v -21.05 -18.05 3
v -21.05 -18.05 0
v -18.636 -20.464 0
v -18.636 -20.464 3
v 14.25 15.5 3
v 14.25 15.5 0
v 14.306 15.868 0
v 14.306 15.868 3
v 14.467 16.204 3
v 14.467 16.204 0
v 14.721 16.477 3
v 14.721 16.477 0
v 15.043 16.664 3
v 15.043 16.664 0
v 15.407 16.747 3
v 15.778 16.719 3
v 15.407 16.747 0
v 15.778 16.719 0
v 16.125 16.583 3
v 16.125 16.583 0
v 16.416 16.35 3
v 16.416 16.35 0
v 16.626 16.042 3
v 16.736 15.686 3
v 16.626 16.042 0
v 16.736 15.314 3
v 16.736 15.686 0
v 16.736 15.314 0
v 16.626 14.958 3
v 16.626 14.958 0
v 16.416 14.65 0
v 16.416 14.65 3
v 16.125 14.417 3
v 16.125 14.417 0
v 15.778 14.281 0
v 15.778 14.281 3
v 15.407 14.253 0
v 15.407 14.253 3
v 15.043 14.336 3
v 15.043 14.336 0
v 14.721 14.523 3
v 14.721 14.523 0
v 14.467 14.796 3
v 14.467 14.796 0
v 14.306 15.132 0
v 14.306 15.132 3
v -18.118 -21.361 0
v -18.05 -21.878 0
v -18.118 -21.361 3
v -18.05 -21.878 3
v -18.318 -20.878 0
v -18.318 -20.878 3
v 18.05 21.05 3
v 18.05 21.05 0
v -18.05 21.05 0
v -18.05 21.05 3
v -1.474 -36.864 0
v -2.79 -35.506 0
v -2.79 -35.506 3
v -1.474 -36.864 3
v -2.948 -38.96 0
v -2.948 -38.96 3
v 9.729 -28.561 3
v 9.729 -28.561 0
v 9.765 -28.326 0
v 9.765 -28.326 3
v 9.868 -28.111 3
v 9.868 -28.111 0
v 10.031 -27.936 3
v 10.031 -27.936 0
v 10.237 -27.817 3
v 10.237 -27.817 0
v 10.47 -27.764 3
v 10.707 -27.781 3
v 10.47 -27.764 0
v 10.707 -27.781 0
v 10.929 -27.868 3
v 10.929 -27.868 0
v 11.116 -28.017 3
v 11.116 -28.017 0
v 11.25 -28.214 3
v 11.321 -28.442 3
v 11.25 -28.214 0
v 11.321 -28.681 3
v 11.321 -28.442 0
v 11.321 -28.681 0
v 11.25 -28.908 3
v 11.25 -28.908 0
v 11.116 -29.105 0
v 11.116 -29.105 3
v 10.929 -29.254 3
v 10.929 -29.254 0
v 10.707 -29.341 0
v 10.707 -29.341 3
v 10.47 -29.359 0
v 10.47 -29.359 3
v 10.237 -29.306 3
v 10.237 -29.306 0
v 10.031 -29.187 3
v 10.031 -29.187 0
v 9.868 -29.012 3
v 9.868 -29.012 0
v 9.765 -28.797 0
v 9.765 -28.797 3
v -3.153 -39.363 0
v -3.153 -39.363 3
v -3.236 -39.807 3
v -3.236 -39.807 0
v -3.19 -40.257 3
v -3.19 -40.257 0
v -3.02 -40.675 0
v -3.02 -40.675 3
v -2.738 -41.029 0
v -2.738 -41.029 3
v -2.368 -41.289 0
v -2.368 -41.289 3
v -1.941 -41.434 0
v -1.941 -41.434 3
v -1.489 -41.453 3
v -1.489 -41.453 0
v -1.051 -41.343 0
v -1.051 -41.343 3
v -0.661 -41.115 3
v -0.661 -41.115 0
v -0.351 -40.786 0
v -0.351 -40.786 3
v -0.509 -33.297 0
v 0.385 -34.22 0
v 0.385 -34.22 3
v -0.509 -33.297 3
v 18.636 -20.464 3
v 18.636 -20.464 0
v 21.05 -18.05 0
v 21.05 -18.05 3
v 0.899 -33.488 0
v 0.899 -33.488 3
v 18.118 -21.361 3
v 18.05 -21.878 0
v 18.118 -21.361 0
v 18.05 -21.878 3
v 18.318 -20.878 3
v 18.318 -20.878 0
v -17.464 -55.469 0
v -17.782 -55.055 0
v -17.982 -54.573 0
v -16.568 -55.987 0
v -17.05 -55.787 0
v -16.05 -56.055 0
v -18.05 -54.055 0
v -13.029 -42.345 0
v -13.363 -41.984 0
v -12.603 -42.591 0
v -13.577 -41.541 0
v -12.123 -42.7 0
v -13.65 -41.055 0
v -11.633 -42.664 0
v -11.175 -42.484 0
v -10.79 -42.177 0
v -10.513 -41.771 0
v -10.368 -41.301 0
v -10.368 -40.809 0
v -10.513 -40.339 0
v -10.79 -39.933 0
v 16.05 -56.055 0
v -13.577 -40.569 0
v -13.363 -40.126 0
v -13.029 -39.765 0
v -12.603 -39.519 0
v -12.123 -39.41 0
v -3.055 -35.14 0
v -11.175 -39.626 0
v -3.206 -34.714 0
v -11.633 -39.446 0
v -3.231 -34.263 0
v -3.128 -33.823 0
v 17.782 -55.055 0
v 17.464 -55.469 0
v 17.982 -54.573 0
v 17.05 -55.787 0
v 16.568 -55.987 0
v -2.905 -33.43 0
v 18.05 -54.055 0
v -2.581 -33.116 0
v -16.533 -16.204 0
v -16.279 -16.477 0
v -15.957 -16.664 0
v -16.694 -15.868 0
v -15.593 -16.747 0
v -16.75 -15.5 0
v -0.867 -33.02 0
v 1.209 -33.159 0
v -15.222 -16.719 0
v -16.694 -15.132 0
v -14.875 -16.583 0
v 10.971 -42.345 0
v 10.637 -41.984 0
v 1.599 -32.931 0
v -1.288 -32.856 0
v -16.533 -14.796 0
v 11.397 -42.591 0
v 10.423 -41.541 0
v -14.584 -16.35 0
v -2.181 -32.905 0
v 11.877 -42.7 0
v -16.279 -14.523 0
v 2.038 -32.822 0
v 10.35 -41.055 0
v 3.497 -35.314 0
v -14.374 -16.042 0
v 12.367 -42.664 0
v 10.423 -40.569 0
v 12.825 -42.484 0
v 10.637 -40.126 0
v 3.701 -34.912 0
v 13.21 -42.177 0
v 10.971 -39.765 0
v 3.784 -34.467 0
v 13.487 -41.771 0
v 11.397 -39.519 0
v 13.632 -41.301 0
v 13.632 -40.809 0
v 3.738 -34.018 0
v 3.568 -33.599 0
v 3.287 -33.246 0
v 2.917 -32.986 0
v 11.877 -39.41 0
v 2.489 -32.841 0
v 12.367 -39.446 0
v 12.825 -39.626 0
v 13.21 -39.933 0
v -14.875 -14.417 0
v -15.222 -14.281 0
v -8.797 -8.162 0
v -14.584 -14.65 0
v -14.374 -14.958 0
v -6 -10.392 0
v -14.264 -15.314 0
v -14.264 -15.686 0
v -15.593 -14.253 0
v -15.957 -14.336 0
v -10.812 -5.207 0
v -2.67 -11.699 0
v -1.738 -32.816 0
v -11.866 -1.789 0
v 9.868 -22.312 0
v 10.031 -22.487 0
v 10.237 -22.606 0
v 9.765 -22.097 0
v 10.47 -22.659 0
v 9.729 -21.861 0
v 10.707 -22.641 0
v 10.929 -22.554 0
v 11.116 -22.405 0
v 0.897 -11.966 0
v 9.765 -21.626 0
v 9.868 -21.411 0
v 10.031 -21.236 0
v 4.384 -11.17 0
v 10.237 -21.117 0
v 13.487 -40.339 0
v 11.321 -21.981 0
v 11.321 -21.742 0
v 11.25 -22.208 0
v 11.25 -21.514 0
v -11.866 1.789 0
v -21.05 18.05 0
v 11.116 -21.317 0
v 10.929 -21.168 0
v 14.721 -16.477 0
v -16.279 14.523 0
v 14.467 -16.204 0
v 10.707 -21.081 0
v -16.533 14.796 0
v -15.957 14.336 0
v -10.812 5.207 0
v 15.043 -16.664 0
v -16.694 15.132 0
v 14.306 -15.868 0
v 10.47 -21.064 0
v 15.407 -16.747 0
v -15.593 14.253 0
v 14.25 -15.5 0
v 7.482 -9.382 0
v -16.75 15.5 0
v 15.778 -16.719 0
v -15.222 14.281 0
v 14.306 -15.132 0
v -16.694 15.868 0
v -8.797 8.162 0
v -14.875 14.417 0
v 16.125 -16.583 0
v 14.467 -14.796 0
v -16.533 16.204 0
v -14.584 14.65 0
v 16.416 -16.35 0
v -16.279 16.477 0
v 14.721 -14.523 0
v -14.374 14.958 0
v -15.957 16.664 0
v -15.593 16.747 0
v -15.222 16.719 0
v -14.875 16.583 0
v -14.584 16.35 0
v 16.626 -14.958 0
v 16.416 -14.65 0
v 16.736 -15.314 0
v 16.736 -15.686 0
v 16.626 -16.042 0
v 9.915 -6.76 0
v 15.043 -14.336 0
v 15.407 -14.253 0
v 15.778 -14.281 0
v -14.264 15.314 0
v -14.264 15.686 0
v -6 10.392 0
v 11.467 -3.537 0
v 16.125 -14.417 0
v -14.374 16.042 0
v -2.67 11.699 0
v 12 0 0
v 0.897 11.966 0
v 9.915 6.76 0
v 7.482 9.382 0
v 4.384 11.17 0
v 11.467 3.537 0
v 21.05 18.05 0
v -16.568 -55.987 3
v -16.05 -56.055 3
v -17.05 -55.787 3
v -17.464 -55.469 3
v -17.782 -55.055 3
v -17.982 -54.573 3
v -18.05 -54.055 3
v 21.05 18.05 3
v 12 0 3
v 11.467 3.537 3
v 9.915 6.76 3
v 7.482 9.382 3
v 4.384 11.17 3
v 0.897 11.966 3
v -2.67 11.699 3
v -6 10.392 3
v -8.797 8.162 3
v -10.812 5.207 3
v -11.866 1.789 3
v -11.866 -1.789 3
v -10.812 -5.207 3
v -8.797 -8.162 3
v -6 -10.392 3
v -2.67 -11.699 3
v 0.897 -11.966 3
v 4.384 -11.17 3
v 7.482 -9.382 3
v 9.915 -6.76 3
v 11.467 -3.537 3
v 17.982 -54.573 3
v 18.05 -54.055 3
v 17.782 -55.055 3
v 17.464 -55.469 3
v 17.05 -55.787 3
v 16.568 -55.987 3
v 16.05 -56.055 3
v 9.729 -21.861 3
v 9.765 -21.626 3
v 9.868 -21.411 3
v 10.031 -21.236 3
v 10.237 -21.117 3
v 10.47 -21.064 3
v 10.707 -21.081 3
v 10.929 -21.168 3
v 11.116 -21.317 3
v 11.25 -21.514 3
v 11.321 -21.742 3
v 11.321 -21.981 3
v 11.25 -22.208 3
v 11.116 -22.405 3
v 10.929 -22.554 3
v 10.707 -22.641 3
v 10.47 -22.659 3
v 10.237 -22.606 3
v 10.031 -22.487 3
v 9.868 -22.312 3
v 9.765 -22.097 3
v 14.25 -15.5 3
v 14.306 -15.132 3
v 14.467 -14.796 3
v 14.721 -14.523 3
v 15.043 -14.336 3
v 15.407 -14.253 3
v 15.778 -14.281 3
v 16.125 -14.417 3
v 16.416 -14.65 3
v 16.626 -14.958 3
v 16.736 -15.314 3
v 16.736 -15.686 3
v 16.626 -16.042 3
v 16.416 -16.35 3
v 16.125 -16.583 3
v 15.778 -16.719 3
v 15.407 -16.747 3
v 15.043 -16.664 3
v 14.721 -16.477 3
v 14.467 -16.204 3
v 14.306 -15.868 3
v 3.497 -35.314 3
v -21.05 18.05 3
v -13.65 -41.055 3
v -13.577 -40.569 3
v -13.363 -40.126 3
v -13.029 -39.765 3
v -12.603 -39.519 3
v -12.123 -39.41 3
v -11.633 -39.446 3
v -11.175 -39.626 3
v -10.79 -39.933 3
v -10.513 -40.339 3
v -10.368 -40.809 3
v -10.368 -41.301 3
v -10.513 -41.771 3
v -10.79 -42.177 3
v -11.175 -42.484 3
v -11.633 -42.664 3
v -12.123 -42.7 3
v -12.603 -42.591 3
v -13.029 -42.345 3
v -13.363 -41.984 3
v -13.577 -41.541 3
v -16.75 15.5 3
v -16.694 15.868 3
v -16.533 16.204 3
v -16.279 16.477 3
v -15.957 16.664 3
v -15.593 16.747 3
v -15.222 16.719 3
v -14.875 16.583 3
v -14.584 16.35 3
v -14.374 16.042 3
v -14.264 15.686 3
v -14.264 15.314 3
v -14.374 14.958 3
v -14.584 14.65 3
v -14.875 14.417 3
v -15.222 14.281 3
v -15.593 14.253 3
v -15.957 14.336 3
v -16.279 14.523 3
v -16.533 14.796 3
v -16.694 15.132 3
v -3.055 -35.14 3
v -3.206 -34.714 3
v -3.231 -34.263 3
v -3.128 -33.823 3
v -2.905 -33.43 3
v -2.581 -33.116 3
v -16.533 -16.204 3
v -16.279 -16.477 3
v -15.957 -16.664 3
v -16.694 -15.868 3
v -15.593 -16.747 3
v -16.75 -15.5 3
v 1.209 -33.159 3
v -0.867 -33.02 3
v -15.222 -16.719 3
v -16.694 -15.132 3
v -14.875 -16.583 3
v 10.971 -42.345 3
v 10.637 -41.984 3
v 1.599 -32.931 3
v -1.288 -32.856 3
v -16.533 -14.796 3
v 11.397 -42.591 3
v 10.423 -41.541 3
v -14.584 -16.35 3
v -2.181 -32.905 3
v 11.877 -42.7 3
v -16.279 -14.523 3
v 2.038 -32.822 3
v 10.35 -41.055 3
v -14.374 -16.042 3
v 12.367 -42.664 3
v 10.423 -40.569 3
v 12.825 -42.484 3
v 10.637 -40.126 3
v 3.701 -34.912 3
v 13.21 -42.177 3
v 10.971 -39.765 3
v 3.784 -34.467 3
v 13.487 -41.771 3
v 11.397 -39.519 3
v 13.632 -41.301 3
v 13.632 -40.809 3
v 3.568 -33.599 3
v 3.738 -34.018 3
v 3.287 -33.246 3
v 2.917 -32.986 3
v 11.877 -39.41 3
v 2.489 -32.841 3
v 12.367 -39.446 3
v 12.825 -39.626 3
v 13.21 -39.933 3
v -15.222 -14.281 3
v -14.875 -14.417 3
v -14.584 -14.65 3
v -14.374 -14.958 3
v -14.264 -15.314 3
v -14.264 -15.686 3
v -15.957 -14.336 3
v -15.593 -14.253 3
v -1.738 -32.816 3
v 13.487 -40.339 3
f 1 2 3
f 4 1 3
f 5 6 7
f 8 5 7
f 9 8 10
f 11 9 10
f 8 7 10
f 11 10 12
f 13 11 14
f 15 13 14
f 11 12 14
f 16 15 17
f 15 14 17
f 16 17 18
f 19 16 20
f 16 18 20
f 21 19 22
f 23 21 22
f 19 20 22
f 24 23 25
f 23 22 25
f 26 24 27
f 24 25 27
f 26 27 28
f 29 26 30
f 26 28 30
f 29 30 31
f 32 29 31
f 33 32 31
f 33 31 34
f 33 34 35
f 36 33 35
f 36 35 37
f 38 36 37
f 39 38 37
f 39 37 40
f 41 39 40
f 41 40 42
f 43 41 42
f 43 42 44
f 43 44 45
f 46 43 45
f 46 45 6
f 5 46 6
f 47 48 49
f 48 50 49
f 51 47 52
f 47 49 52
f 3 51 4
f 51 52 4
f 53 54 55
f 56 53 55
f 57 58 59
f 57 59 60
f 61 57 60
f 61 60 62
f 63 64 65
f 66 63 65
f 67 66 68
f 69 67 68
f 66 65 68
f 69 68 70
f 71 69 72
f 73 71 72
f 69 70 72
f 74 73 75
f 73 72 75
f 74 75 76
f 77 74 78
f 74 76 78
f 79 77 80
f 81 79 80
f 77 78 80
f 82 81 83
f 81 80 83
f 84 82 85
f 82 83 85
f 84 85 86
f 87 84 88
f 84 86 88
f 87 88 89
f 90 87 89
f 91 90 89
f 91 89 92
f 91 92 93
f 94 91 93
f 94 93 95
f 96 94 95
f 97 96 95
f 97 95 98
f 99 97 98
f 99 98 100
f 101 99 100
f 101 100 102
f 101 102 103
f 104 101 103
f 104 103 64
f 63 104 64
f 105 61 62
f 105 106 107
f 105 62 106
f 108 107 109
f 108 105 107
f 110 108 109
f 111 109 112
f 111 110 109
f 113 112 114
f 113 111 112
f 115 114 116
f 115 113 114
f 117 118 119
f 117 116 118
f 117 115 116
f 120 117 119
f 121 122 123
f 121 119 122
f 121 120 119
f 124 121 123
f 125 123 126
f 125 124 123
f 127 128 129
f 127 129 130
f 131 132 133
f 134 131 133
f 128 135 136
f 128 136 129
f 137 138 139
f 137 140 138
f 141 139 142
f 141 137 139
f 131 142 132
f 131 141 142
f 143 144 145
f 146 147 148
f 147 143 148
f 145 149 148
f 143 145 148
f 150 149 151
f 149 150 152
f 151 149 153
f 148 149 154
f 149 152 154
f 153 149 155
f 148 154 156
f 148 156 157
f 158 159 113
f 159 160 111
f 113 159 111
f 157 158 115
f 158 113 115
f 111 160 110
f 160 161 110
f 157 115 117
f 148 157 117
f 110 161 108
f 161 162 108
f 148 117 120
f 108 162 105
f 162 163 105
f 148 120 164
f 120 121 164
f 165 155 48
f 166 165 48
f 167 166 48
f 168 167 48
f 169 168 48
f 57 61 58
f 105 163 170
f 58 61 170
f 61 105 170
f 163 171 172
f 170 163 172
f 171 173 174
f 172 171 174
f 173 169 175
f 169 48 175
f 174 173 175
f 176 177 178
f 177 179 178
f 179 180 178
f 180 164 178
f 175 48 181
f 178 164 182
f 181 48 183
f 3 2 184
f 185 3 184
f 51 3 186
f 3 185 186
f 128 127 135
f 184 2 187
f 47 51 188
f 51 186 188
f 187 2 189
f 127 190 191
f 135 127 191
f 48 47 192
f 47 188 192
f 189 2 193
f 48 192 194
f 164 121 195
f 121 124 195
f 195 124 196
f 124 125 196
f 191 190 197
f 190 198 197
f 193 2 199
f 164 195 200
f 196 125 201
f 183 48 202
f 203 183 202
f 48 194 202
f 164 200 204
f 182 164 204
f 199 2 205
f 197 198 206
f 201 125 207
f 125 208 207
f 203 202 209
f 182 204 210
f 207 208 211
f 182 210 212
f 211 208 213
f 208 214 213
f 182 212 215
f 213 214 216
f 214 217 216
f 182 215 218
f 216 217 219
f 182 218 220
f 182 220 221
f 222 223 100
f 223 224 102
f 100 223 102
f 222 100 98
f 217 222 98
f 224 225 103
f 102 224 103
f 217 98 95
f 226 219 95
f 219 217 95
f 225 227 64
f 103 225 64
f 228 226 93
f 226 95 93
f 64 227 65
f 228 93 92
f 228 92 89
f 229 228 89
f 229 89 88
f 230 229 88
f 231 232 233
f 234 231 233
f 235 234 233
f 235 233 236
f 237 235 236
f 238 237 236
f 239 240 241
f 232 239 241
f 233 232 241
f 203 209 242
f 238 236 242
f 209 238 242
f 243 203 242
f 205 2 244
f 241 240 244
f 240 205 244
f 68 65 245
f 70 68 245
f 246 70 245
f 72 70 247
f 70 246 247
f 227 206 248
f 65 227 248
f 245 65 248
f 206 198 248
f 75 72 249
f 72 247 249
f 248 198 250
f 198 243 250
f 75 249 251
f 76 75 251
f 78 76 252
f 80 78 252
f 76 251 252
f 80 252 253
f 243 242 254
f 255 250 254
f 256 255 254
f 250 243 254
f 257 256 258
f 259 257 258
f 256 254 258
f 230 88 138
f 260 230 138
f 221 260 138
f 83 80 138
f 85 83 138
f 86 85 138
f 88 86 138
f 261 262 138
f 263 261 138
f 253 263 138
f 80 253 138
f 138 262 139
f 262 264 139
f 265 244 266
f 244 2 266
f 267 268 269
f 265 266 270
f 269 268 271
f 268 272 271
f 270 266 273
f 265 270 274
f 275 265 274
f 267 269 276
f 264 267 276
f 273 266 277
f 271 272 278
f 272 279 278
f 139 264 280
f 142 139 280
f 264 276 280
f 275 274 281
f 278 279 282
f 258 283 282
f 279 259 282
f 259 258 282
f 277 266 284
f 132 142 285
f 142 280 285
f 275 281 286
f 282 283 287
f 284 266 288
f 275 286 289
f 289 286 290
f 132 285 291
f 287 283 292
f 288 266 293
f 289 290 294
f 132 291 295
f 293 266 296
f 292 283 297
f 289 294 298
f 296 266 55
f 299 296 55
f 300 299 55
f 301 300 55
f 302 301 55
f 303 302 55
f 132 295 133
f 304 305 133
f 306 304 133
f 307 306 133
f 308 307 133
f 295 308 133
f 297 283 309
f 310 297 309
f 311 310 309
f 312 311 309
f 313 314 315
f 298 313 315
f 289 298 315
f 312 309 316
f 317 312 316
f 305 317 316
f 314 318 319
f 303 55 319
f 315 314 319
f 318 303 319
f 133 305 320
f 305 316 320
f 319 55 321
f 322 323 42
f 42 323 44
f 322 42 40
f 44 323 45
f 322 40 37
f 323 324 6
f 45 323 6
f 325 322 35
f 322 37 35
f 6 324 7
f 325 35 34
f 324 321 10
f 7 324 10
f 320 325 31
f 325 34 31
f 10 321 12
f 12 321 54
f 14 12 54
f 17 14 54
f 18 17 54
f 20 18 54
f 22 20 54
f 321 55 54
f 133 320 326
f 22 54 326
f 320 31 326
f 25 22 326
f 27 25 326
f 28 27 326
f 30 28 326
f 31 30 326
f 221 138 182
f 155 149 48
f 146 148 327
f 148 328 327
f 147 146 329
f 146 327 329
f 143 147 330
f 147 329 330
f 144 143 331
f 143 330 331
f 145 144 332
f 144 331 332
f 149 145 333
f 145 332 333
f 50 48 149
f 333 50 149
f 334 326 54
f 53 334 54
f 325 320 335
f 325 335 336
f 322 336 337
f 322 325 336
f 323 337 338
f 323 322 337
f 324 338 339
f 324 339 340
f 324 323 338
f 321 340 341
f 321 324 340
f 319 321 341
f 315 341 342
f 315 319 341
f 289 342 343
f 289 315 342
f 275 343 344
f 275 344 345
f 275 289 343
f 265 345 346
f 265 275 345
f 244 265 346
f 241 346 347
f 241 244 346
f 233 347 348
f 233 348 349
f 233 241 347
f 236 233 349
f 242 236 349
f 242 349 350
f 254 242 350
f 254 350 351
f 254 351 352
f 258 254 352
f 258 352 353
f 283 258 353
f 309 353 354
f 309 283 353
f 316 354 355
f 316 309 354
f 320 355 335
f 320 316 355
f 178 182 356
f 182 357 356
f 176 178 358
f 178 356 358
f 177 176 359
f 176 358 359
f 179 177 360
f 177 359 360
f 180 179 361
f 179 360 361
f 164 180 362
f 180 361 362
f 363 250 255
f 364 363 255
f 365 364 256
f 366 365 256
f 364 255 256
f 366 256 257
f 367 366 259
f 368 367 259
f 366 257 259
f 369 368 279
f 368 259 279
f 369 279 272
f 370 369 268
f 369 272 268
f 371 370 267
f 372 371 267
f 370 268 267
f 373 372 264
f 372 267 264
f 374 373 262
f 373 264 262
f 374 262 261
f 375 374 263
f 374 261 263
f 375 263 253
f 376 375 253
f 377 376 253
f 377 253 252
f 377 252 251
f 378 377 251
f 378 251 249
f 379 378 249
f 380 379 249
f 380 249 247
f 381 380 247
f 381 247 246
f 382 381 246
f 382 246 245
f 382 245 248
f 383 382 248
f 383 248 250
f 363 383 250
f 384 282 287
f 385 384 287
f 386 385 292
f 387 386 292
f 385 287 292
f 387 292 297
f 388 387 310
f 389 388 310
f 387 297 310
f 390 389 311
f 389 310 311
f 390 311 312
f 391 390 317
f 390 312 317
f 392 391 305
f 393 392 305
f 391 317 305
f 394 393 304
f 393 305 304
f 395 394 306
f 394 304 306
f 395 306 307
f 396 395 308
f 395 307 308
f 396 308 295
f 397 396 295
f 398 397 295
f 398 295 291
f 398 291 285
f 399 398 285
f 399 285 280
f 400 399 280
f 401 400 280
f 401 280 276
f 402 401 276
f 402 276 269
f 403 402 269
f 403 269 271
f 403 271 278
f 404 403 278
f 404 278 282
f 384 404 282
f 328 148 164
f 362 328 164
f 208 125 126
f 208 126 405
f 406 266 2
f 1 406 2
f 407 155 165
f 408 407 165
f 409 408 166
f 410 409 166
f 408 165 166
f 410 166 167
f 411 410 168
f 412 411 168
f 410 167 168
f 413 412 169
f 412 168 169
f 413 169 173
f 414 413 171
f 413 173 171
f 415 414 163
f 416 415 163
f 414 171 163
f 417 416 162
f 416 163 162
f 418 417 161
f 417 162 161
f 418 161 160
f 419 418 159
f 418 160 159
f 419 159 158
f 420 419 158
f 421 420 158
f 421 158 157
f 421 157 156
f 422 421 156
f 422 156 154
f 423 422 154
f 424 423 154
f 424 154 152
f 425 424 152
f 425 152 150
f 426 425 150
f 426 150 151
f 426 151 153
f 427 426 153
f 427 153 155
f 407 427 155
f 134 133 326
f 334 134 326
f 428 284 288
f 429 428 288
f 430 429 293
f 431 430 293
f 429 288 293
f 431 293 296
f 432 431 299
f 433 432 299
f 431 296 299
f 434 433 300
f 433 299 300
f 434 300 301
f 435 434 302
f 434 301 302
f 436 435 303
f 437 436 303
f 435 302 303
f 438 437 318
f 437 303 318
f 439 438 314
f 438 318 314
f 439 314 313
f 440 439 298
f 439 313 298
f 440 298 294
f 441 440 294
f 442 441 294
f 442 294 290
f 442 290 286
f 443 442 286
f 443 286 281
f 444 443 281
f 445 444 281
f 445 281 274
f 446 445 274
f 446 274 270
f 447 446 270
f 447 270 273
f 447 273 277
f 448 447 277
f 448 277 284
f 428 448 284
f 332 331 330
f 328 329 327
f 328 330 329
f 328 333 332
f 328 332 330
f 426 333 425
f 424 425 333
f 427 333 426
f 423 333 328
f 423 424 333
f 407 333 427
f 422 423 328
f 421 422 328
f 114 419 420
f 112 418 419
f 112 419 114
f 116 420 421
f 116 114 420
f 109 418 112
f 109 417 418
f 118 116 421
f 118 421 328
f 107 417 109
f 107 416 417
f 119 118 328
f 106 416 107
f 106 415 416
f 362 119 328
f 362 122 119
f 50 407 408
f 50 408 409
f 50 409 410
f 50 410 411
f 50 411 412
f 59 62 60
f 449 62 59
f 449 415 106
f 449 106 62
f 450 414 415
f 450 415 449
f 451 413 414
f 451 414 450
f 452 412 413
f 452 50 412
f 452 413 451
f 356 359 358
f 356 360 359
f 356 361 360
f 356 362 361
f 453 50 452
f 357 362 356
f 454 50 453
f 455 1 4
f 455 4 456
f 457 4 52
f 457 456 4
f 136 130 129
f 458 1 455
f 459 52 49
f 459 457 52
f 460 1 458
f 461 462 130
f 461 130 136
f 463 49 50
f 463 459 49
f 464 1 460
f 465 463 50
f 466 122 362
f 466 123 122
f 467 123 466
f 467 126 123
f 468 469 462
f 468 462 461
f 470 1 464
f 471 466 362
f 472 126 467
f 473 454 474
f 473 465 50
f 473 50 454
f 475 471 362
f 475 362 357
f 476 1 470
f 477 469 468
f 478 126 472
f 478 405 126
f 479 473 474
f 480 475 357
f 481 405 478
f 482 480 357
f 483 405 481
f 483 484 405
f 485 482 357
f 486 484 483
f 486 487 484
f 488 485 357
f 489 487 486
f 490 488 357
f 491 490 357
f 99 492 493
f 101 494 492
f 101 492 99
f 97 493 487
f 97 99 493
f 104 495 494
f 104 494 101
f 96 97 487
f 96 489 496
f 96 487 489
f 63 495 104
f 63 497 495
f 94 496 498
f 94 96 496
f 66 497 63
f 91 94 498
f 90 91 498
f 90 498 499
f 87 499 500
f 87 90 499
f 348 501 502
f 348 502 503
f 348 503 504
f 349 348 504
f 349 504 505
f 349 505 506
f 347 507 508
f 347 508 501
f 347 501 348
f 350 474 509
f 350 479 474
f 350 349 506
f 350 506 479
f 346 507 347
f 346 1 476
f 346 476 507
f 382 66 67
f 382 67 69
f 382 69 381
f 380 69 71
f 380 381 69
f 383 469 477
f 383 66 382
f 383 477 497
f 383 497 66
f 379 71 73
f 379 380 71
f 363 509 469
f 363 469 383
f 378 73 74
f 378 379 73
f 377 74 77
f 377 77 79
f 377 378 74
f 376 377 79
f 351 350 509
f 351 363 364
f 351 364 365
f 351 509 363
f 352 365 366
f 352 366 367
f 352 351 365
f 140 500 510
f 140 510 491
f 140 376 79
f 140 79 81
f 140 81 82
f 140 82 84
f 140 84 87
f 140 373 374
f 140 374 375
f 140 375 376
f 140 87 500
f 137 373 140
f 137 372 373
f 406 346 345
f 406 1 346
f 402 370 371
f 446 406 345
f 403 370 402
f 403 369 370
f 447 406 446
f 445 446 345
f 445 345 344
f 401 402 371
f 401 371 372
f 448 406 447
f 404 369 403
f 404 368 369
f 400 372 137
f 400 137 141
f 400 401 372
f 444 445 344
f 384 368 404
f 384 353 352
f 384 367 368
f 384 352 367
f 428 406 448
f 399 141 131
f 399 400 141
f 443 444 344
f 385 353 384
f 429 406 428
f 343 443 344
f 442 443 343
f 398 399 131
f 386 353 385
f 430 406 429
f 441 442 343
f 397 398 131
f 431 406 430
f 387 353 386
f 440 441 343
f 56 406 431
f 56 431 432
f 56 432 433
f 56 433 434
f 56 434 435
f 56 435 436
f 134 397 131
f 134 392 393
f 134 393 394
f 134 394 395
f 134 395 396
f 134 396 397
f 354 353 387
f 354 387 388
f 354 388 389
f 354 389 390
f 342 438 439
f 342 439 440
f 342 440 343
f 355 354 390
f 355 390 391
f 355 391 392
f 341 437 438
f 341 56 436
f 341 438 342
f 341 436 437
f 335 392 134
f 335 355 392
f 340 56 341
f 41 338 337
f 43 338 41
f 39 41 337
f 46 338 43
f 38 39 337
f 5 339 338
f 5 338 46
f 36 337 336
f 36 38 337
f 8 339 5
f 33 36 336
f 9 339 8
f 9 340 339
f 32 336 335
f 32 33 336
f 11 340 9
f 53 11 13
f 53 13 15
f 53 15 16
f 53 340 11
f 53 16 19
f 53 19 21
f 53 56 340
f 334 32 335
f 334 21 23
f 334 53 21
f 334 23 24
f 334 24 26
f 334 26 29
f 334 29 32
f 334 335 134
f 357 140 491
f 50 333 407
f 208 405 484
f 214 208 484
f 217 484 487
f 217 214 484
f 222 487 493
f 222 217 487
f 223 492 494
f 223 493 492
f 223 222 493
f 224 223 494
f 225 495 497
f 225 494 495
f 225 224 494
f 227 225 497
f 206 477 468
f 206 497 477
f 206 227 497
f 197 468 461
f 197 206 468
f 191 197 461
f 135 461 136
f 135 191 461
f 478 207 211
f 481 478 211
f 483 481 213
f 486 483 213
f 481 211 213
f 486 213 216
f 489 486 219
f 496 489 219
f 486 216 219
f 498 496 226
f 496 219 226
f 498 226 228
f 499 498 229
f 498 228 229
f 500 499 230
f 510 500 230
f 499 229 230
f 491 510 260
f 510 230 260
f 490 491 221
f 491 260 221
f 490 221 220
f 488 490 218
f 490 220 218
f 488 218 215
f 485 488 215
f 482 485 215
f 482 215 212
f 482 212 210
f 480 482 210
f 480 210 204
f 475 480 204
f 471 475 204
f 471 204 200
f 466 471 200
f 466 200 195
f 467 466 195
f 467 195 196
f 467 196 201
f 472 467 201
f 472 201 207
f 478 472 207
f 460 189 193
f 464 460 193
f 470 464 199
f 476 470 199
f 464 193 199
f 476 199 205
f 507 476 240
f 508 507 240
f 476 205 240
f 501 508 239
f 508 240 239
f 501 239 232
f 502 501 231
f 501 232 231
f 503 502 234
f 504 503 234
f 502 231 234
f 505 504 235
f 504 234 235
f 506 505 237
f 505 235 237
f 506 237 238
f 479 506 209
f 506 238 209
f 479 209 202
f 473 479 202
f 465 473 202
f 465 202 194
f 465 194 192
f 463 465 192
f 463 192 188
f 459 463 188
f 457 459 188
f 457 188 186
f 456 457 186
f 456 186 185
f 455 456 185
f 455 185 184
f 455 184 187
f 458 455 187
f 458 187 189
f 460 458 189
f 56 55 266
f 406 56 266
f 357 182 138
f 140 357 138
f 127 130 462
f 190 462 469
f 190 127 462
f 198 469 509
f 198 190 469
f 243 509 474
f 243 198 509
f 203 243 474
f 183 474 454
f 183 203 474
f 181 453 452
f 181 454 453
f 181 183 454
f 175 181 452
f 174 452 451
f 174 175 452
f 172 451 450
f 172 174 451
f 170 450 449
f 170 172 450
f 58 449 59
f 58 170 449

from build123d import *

# Parameters (mm, degrees)
SKETCH1_R                   = 12
BOSS_EXTRUDE1_DEPTH         = 3
TAP_DRILL_FOR_M3_TAP1_D     = 2.5
TAP_DRILL_FOR_M3_TAP1_DEPTH = 5
TAP_DRILL_FOR_M3_TAP1_TIP   = 0.751075774
TAP_DRILL_FOR_M4_TAP1_D     = 3.3
TAP_DRILL_FOR_M4_TAP1_DEPTH = 5
TAP_DRILL_FOR_M4_TAP1_TIP   = 0.991420021
FILLET1_R                   = 2
TAP_DRILL_FOR_M2_TAP1_D     = 1.6
TAP_DRILL_FOR_M2_TAP1_DEPTH = 5
TAP_DRILL_FOR_M2_TAP1_TIP   = 0.480688495
CUT_EXTRUDE1_DEPTH          = 10


with BuildPart() as part:
    # Sketch1 → Boss-Extrude1 (new body)
    with BuildSketch(Plane.XY):
        Polygon((18.05, -56.055), (18.05, -21.05), (21.05, -18.05), (21.05, 18.05), (18.05, 21.05), (-18.05, 21.05), (-21.05, 18.05), (-21.05, -18.05), (-18.05, -21.05), (-18.05, -56.055), align=None)
        Circle(SKETCH1_R, mode=Mode.SUBTRACT)
    extrude(amount=BOSS_EXTRUDE1_DEPTH)

    # Tap Drill for M3 Tap1
    with Locations(Plane.XY.offset(3)):
        with Locations((-15.5, 15.5), (15.5, 15.5), (-15.5, -15.5), (15.5, -15.5)):
            Hole(TAP_DRILL_FOR_M3_TAP1_D / 2, depth=TAP_DRILL_FOR_M3_TAP1_DEPTH)
            with Locations((0, 0, -(TAP_DRILL_FOR_M3_TAP1_DEPTH + TAP_DRILL_FOR_M3_TAP1_TIP / 2))):  # 118° drill point
                Cone(0, TAP_DRILL_FOR_M3_TAP1_D / 2, TAP_DRILL_FOR_M3_TAP1_TIP, mode=Mode.SUBTRACT)

    # Tap Drill for M4 Tap1
    with Locations(Plane.XY.offset(3)):
        with Locations((12, -41.055), (-12, -41.055)):
            Hole(TAP_DRILL_FOR_M4_TAP1_D / 2, depth=TAP_DRILL_FOR_M4_TAP1_DEPTH)
            with Locations((0, 0, -(TAP_DRILL_FOR_M4_TAP1_DEPTH + TAP_DRILL_FOR_M4_TAP1_TIP / 2))):  # 118° drill point
                Cone(0, TAP_DRILL_FOR_M4_TAP1_D / 2, TAP_DRILL_FOR_M4_TAP1_TIP, mode=Mode.SUBTRACT)

    # Fillet1
    fillet1_edges = [part.edges().sort_by_distance(p)[0] for p in [
        (18.05, -21.05, 1.5),
        (18.05, -56.055, 1.5),
        (-18.05, -56.055, 1.5),
        (-18.05, -21.05, 1.5),
    ]]
    fillet(fillet1_edges, radius=FILLET1_R)

    # Tap Drill for M2 Tap1
    with Locations(Plane.XY.offset(3)):
        with Locations((10.52945603, -21.86131015), (10.52945603, -28.56131015)):
            Hole(TAP_DRILL_FOR_M2_TAP1_D / 2, depth=TAP_DRILL_FOR_M2_TAP1_DEPTH)
            with Locations((0, 0, -(TAP_DRILL_FOR_M2_TAP1_DEPTH + TAP_DRILL_FOR_M2_TAP1_TIP / 2))):  # 118° drill point
                Cone(0, TAP_DRILL_FOR_M2_TAP1_D / 2, TAP_DRILL_FOR_M2_TAP1_TIP, mode=Mode.SUBTRACT)

    # Sketch8 → Cut-Extrude1 (cut)
    with BuildSketch(Plane.XY):
        with BuildLine():
            Line((-0.350833888, -40.786266358), (3.496510612, -35.314487513))
            ThreePointArc((3.496510612, -35.314487513), (3.110982416, -33.102773131), (0.899268034, -33.488301326))
            Line((0.899268034, -33.488301326), (0.384994593, -34.219712442))
            Line((0.384994593, -34.219712442), (-0.509366672, -33.296697877))
            ThreePointArc((-0.509366672, -33.296697877), (-2.754151719, -33.261305914), (-2.789543683, -35.506090962))
            Line((-2.789543683, -35.506090962), (-1.474067559, -36.863711947))
            Line((-1.474067559, -36.863711947), (-2.948076466, -38.96008017))
            ThreePointArc((-2.948076466, -38.96008017), (-2.562548271, -41.171794553), (-0.350833888, -40.786266358))
        make_face()
    extrude(amount=CUT_EXTRUDE1_DEPTH, mode=Mode.SUBTRACT)


solid = part.part
